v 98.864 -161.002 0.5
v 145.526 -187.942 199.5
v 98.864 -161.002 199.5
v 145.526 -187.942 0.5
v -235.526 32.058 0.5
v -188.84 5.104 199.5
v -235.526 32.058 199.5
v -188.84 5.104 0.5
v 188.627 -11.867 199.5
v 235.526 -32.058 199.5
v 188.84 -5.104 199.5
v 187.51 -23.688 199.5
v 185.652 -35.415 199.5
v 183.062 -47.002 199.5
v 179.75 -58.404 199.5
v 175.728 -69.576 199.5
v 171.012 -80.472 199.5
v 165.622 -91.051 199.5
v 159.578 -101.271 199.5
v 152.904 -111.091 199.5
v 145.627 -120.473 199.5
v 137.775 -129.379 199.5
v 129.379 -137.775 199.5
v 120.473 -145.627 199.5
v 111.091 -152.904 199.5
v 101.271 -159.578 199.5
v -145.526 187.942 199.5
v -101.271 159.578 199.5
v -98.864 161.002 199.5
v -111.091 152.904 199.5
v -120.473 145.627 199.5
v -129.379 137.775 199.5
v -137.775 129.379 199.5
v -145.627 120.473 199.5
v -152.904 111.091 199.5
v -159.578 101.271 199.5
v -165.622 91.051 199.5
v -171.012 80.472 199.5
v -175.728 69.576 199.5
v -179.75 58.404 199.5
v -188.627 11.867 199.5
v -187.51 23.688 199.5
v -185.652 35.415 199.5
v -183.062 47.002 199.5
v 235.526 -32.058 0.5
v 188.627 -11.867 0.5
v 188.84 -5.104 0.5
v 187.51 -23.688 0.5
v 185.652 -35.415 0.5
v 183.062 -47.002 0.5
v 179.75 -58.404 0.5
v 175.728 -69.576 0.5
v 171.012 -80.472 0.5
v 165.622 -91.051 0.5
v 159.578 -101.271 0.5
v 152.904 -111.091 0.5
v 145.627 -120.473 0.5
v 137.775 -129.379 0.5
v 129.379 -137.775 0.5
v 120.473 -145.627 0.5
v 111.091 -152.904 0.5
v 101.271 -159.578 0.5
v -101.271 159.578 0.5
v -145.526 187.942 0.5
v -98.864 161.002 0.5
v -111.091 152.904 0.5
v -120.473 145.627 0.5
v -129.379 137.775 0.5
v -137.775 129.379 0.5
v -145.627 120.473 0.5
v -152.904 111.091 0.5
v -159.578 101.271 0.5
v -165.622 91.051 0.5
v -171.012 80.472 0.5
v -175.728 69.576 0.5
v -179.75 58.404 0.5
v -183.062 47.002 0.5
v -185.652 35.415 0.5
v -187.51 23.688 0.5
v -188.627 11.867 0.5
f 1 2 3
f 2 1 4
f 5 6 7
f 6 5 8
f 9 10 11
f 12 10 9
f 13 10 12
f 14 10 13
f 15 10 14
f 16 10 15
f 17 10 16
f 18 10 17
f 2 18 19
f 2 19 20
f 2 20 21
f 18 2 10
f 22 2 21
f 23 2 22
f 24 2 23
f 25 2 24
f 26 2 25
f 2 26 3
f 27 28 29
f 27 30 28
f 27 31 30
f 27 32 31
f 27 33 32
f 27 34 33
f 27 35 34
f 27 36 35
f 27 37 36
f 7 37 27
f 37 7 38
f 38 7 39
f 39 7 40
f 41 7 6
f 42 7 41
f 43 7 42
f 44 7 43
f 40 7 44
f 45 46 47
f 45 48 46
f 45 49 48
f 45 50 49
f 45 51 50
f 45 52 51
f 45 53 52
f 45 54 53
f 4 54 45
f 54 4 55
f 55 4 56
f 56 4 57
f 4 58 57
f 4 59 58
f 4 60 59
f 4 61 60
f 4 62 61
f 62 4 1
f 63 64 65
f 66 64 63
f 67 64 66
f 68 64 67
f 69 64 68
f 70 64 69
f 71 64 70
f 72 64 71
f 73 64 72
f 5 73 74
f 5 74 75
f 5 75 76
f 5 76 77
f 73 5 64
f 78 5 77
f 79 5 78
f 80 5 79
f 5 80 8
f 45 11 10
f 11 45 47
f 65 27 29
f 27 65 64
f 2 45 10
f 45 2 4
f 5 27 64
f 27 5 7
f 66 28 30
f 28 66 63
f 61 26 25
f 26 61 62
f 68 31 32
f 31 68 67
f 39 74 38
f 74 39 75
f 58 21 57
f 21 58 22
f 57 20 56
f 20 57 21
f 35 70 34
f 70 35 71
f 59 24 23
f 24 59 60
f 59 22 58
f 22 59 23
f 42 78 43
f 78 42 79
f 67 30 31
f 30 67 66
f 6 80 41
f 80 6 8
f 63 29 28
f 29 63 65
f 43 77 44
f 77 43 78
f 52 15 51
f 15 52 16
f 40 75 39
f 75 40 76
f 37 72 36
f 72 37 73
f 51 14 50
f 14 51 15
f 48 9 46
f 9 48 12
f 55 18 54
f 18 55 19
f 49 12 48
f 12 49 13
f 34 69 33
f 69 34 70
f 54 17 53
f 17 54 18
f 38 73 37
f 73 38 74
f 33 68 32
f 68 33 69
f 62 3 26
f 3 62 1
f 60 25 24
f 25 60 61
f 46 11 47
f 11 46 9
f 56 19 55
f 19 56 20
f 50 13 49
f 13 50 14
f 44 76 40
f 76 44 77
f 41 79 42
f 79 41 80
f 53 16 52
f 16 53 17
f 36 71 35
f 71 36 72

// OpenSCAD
difference() {
rotate([0,0,240]){translate([0,0,100]){cube([180,440,199], center = true);}}
translate([0,0,100]) {cylinder (r = 189, h = 199, $fn = 100, center = true);}

union() {
linear_extrude(height = 200, twist = 90, $fn = 400) translate([-50,-100,0]){import(file = "wing.dxf", center = false, $fn = 100);} rotate([0,30,0]);

rotate([0,0,90]) {linear_extrude(height = 200, twist = 90, $fn = 400) translate([-50,-100,0]){import(file = "wing.dxf", center = false, $fn = 100);} rotate([0,30,0]);}

rotate([0,0,180]) {linear_extrude(height = 200, twist = 90, $fn = 400) translate([-50,-100,0]){import(file = "wing.dxf", center = false, $fn = 100);} rotate([0,30,0]);}

rotate([0,0,270]) {linear_extrude(height = 200, twist = 90, $fn = 400) translate([-50,-100,0]){import(file = "wing.dxf", center = false, $fn = 100);} rotate([0,30,0]);}
}
cylinder(h = 400, r = 180, center = true, $fn = 6);
}
